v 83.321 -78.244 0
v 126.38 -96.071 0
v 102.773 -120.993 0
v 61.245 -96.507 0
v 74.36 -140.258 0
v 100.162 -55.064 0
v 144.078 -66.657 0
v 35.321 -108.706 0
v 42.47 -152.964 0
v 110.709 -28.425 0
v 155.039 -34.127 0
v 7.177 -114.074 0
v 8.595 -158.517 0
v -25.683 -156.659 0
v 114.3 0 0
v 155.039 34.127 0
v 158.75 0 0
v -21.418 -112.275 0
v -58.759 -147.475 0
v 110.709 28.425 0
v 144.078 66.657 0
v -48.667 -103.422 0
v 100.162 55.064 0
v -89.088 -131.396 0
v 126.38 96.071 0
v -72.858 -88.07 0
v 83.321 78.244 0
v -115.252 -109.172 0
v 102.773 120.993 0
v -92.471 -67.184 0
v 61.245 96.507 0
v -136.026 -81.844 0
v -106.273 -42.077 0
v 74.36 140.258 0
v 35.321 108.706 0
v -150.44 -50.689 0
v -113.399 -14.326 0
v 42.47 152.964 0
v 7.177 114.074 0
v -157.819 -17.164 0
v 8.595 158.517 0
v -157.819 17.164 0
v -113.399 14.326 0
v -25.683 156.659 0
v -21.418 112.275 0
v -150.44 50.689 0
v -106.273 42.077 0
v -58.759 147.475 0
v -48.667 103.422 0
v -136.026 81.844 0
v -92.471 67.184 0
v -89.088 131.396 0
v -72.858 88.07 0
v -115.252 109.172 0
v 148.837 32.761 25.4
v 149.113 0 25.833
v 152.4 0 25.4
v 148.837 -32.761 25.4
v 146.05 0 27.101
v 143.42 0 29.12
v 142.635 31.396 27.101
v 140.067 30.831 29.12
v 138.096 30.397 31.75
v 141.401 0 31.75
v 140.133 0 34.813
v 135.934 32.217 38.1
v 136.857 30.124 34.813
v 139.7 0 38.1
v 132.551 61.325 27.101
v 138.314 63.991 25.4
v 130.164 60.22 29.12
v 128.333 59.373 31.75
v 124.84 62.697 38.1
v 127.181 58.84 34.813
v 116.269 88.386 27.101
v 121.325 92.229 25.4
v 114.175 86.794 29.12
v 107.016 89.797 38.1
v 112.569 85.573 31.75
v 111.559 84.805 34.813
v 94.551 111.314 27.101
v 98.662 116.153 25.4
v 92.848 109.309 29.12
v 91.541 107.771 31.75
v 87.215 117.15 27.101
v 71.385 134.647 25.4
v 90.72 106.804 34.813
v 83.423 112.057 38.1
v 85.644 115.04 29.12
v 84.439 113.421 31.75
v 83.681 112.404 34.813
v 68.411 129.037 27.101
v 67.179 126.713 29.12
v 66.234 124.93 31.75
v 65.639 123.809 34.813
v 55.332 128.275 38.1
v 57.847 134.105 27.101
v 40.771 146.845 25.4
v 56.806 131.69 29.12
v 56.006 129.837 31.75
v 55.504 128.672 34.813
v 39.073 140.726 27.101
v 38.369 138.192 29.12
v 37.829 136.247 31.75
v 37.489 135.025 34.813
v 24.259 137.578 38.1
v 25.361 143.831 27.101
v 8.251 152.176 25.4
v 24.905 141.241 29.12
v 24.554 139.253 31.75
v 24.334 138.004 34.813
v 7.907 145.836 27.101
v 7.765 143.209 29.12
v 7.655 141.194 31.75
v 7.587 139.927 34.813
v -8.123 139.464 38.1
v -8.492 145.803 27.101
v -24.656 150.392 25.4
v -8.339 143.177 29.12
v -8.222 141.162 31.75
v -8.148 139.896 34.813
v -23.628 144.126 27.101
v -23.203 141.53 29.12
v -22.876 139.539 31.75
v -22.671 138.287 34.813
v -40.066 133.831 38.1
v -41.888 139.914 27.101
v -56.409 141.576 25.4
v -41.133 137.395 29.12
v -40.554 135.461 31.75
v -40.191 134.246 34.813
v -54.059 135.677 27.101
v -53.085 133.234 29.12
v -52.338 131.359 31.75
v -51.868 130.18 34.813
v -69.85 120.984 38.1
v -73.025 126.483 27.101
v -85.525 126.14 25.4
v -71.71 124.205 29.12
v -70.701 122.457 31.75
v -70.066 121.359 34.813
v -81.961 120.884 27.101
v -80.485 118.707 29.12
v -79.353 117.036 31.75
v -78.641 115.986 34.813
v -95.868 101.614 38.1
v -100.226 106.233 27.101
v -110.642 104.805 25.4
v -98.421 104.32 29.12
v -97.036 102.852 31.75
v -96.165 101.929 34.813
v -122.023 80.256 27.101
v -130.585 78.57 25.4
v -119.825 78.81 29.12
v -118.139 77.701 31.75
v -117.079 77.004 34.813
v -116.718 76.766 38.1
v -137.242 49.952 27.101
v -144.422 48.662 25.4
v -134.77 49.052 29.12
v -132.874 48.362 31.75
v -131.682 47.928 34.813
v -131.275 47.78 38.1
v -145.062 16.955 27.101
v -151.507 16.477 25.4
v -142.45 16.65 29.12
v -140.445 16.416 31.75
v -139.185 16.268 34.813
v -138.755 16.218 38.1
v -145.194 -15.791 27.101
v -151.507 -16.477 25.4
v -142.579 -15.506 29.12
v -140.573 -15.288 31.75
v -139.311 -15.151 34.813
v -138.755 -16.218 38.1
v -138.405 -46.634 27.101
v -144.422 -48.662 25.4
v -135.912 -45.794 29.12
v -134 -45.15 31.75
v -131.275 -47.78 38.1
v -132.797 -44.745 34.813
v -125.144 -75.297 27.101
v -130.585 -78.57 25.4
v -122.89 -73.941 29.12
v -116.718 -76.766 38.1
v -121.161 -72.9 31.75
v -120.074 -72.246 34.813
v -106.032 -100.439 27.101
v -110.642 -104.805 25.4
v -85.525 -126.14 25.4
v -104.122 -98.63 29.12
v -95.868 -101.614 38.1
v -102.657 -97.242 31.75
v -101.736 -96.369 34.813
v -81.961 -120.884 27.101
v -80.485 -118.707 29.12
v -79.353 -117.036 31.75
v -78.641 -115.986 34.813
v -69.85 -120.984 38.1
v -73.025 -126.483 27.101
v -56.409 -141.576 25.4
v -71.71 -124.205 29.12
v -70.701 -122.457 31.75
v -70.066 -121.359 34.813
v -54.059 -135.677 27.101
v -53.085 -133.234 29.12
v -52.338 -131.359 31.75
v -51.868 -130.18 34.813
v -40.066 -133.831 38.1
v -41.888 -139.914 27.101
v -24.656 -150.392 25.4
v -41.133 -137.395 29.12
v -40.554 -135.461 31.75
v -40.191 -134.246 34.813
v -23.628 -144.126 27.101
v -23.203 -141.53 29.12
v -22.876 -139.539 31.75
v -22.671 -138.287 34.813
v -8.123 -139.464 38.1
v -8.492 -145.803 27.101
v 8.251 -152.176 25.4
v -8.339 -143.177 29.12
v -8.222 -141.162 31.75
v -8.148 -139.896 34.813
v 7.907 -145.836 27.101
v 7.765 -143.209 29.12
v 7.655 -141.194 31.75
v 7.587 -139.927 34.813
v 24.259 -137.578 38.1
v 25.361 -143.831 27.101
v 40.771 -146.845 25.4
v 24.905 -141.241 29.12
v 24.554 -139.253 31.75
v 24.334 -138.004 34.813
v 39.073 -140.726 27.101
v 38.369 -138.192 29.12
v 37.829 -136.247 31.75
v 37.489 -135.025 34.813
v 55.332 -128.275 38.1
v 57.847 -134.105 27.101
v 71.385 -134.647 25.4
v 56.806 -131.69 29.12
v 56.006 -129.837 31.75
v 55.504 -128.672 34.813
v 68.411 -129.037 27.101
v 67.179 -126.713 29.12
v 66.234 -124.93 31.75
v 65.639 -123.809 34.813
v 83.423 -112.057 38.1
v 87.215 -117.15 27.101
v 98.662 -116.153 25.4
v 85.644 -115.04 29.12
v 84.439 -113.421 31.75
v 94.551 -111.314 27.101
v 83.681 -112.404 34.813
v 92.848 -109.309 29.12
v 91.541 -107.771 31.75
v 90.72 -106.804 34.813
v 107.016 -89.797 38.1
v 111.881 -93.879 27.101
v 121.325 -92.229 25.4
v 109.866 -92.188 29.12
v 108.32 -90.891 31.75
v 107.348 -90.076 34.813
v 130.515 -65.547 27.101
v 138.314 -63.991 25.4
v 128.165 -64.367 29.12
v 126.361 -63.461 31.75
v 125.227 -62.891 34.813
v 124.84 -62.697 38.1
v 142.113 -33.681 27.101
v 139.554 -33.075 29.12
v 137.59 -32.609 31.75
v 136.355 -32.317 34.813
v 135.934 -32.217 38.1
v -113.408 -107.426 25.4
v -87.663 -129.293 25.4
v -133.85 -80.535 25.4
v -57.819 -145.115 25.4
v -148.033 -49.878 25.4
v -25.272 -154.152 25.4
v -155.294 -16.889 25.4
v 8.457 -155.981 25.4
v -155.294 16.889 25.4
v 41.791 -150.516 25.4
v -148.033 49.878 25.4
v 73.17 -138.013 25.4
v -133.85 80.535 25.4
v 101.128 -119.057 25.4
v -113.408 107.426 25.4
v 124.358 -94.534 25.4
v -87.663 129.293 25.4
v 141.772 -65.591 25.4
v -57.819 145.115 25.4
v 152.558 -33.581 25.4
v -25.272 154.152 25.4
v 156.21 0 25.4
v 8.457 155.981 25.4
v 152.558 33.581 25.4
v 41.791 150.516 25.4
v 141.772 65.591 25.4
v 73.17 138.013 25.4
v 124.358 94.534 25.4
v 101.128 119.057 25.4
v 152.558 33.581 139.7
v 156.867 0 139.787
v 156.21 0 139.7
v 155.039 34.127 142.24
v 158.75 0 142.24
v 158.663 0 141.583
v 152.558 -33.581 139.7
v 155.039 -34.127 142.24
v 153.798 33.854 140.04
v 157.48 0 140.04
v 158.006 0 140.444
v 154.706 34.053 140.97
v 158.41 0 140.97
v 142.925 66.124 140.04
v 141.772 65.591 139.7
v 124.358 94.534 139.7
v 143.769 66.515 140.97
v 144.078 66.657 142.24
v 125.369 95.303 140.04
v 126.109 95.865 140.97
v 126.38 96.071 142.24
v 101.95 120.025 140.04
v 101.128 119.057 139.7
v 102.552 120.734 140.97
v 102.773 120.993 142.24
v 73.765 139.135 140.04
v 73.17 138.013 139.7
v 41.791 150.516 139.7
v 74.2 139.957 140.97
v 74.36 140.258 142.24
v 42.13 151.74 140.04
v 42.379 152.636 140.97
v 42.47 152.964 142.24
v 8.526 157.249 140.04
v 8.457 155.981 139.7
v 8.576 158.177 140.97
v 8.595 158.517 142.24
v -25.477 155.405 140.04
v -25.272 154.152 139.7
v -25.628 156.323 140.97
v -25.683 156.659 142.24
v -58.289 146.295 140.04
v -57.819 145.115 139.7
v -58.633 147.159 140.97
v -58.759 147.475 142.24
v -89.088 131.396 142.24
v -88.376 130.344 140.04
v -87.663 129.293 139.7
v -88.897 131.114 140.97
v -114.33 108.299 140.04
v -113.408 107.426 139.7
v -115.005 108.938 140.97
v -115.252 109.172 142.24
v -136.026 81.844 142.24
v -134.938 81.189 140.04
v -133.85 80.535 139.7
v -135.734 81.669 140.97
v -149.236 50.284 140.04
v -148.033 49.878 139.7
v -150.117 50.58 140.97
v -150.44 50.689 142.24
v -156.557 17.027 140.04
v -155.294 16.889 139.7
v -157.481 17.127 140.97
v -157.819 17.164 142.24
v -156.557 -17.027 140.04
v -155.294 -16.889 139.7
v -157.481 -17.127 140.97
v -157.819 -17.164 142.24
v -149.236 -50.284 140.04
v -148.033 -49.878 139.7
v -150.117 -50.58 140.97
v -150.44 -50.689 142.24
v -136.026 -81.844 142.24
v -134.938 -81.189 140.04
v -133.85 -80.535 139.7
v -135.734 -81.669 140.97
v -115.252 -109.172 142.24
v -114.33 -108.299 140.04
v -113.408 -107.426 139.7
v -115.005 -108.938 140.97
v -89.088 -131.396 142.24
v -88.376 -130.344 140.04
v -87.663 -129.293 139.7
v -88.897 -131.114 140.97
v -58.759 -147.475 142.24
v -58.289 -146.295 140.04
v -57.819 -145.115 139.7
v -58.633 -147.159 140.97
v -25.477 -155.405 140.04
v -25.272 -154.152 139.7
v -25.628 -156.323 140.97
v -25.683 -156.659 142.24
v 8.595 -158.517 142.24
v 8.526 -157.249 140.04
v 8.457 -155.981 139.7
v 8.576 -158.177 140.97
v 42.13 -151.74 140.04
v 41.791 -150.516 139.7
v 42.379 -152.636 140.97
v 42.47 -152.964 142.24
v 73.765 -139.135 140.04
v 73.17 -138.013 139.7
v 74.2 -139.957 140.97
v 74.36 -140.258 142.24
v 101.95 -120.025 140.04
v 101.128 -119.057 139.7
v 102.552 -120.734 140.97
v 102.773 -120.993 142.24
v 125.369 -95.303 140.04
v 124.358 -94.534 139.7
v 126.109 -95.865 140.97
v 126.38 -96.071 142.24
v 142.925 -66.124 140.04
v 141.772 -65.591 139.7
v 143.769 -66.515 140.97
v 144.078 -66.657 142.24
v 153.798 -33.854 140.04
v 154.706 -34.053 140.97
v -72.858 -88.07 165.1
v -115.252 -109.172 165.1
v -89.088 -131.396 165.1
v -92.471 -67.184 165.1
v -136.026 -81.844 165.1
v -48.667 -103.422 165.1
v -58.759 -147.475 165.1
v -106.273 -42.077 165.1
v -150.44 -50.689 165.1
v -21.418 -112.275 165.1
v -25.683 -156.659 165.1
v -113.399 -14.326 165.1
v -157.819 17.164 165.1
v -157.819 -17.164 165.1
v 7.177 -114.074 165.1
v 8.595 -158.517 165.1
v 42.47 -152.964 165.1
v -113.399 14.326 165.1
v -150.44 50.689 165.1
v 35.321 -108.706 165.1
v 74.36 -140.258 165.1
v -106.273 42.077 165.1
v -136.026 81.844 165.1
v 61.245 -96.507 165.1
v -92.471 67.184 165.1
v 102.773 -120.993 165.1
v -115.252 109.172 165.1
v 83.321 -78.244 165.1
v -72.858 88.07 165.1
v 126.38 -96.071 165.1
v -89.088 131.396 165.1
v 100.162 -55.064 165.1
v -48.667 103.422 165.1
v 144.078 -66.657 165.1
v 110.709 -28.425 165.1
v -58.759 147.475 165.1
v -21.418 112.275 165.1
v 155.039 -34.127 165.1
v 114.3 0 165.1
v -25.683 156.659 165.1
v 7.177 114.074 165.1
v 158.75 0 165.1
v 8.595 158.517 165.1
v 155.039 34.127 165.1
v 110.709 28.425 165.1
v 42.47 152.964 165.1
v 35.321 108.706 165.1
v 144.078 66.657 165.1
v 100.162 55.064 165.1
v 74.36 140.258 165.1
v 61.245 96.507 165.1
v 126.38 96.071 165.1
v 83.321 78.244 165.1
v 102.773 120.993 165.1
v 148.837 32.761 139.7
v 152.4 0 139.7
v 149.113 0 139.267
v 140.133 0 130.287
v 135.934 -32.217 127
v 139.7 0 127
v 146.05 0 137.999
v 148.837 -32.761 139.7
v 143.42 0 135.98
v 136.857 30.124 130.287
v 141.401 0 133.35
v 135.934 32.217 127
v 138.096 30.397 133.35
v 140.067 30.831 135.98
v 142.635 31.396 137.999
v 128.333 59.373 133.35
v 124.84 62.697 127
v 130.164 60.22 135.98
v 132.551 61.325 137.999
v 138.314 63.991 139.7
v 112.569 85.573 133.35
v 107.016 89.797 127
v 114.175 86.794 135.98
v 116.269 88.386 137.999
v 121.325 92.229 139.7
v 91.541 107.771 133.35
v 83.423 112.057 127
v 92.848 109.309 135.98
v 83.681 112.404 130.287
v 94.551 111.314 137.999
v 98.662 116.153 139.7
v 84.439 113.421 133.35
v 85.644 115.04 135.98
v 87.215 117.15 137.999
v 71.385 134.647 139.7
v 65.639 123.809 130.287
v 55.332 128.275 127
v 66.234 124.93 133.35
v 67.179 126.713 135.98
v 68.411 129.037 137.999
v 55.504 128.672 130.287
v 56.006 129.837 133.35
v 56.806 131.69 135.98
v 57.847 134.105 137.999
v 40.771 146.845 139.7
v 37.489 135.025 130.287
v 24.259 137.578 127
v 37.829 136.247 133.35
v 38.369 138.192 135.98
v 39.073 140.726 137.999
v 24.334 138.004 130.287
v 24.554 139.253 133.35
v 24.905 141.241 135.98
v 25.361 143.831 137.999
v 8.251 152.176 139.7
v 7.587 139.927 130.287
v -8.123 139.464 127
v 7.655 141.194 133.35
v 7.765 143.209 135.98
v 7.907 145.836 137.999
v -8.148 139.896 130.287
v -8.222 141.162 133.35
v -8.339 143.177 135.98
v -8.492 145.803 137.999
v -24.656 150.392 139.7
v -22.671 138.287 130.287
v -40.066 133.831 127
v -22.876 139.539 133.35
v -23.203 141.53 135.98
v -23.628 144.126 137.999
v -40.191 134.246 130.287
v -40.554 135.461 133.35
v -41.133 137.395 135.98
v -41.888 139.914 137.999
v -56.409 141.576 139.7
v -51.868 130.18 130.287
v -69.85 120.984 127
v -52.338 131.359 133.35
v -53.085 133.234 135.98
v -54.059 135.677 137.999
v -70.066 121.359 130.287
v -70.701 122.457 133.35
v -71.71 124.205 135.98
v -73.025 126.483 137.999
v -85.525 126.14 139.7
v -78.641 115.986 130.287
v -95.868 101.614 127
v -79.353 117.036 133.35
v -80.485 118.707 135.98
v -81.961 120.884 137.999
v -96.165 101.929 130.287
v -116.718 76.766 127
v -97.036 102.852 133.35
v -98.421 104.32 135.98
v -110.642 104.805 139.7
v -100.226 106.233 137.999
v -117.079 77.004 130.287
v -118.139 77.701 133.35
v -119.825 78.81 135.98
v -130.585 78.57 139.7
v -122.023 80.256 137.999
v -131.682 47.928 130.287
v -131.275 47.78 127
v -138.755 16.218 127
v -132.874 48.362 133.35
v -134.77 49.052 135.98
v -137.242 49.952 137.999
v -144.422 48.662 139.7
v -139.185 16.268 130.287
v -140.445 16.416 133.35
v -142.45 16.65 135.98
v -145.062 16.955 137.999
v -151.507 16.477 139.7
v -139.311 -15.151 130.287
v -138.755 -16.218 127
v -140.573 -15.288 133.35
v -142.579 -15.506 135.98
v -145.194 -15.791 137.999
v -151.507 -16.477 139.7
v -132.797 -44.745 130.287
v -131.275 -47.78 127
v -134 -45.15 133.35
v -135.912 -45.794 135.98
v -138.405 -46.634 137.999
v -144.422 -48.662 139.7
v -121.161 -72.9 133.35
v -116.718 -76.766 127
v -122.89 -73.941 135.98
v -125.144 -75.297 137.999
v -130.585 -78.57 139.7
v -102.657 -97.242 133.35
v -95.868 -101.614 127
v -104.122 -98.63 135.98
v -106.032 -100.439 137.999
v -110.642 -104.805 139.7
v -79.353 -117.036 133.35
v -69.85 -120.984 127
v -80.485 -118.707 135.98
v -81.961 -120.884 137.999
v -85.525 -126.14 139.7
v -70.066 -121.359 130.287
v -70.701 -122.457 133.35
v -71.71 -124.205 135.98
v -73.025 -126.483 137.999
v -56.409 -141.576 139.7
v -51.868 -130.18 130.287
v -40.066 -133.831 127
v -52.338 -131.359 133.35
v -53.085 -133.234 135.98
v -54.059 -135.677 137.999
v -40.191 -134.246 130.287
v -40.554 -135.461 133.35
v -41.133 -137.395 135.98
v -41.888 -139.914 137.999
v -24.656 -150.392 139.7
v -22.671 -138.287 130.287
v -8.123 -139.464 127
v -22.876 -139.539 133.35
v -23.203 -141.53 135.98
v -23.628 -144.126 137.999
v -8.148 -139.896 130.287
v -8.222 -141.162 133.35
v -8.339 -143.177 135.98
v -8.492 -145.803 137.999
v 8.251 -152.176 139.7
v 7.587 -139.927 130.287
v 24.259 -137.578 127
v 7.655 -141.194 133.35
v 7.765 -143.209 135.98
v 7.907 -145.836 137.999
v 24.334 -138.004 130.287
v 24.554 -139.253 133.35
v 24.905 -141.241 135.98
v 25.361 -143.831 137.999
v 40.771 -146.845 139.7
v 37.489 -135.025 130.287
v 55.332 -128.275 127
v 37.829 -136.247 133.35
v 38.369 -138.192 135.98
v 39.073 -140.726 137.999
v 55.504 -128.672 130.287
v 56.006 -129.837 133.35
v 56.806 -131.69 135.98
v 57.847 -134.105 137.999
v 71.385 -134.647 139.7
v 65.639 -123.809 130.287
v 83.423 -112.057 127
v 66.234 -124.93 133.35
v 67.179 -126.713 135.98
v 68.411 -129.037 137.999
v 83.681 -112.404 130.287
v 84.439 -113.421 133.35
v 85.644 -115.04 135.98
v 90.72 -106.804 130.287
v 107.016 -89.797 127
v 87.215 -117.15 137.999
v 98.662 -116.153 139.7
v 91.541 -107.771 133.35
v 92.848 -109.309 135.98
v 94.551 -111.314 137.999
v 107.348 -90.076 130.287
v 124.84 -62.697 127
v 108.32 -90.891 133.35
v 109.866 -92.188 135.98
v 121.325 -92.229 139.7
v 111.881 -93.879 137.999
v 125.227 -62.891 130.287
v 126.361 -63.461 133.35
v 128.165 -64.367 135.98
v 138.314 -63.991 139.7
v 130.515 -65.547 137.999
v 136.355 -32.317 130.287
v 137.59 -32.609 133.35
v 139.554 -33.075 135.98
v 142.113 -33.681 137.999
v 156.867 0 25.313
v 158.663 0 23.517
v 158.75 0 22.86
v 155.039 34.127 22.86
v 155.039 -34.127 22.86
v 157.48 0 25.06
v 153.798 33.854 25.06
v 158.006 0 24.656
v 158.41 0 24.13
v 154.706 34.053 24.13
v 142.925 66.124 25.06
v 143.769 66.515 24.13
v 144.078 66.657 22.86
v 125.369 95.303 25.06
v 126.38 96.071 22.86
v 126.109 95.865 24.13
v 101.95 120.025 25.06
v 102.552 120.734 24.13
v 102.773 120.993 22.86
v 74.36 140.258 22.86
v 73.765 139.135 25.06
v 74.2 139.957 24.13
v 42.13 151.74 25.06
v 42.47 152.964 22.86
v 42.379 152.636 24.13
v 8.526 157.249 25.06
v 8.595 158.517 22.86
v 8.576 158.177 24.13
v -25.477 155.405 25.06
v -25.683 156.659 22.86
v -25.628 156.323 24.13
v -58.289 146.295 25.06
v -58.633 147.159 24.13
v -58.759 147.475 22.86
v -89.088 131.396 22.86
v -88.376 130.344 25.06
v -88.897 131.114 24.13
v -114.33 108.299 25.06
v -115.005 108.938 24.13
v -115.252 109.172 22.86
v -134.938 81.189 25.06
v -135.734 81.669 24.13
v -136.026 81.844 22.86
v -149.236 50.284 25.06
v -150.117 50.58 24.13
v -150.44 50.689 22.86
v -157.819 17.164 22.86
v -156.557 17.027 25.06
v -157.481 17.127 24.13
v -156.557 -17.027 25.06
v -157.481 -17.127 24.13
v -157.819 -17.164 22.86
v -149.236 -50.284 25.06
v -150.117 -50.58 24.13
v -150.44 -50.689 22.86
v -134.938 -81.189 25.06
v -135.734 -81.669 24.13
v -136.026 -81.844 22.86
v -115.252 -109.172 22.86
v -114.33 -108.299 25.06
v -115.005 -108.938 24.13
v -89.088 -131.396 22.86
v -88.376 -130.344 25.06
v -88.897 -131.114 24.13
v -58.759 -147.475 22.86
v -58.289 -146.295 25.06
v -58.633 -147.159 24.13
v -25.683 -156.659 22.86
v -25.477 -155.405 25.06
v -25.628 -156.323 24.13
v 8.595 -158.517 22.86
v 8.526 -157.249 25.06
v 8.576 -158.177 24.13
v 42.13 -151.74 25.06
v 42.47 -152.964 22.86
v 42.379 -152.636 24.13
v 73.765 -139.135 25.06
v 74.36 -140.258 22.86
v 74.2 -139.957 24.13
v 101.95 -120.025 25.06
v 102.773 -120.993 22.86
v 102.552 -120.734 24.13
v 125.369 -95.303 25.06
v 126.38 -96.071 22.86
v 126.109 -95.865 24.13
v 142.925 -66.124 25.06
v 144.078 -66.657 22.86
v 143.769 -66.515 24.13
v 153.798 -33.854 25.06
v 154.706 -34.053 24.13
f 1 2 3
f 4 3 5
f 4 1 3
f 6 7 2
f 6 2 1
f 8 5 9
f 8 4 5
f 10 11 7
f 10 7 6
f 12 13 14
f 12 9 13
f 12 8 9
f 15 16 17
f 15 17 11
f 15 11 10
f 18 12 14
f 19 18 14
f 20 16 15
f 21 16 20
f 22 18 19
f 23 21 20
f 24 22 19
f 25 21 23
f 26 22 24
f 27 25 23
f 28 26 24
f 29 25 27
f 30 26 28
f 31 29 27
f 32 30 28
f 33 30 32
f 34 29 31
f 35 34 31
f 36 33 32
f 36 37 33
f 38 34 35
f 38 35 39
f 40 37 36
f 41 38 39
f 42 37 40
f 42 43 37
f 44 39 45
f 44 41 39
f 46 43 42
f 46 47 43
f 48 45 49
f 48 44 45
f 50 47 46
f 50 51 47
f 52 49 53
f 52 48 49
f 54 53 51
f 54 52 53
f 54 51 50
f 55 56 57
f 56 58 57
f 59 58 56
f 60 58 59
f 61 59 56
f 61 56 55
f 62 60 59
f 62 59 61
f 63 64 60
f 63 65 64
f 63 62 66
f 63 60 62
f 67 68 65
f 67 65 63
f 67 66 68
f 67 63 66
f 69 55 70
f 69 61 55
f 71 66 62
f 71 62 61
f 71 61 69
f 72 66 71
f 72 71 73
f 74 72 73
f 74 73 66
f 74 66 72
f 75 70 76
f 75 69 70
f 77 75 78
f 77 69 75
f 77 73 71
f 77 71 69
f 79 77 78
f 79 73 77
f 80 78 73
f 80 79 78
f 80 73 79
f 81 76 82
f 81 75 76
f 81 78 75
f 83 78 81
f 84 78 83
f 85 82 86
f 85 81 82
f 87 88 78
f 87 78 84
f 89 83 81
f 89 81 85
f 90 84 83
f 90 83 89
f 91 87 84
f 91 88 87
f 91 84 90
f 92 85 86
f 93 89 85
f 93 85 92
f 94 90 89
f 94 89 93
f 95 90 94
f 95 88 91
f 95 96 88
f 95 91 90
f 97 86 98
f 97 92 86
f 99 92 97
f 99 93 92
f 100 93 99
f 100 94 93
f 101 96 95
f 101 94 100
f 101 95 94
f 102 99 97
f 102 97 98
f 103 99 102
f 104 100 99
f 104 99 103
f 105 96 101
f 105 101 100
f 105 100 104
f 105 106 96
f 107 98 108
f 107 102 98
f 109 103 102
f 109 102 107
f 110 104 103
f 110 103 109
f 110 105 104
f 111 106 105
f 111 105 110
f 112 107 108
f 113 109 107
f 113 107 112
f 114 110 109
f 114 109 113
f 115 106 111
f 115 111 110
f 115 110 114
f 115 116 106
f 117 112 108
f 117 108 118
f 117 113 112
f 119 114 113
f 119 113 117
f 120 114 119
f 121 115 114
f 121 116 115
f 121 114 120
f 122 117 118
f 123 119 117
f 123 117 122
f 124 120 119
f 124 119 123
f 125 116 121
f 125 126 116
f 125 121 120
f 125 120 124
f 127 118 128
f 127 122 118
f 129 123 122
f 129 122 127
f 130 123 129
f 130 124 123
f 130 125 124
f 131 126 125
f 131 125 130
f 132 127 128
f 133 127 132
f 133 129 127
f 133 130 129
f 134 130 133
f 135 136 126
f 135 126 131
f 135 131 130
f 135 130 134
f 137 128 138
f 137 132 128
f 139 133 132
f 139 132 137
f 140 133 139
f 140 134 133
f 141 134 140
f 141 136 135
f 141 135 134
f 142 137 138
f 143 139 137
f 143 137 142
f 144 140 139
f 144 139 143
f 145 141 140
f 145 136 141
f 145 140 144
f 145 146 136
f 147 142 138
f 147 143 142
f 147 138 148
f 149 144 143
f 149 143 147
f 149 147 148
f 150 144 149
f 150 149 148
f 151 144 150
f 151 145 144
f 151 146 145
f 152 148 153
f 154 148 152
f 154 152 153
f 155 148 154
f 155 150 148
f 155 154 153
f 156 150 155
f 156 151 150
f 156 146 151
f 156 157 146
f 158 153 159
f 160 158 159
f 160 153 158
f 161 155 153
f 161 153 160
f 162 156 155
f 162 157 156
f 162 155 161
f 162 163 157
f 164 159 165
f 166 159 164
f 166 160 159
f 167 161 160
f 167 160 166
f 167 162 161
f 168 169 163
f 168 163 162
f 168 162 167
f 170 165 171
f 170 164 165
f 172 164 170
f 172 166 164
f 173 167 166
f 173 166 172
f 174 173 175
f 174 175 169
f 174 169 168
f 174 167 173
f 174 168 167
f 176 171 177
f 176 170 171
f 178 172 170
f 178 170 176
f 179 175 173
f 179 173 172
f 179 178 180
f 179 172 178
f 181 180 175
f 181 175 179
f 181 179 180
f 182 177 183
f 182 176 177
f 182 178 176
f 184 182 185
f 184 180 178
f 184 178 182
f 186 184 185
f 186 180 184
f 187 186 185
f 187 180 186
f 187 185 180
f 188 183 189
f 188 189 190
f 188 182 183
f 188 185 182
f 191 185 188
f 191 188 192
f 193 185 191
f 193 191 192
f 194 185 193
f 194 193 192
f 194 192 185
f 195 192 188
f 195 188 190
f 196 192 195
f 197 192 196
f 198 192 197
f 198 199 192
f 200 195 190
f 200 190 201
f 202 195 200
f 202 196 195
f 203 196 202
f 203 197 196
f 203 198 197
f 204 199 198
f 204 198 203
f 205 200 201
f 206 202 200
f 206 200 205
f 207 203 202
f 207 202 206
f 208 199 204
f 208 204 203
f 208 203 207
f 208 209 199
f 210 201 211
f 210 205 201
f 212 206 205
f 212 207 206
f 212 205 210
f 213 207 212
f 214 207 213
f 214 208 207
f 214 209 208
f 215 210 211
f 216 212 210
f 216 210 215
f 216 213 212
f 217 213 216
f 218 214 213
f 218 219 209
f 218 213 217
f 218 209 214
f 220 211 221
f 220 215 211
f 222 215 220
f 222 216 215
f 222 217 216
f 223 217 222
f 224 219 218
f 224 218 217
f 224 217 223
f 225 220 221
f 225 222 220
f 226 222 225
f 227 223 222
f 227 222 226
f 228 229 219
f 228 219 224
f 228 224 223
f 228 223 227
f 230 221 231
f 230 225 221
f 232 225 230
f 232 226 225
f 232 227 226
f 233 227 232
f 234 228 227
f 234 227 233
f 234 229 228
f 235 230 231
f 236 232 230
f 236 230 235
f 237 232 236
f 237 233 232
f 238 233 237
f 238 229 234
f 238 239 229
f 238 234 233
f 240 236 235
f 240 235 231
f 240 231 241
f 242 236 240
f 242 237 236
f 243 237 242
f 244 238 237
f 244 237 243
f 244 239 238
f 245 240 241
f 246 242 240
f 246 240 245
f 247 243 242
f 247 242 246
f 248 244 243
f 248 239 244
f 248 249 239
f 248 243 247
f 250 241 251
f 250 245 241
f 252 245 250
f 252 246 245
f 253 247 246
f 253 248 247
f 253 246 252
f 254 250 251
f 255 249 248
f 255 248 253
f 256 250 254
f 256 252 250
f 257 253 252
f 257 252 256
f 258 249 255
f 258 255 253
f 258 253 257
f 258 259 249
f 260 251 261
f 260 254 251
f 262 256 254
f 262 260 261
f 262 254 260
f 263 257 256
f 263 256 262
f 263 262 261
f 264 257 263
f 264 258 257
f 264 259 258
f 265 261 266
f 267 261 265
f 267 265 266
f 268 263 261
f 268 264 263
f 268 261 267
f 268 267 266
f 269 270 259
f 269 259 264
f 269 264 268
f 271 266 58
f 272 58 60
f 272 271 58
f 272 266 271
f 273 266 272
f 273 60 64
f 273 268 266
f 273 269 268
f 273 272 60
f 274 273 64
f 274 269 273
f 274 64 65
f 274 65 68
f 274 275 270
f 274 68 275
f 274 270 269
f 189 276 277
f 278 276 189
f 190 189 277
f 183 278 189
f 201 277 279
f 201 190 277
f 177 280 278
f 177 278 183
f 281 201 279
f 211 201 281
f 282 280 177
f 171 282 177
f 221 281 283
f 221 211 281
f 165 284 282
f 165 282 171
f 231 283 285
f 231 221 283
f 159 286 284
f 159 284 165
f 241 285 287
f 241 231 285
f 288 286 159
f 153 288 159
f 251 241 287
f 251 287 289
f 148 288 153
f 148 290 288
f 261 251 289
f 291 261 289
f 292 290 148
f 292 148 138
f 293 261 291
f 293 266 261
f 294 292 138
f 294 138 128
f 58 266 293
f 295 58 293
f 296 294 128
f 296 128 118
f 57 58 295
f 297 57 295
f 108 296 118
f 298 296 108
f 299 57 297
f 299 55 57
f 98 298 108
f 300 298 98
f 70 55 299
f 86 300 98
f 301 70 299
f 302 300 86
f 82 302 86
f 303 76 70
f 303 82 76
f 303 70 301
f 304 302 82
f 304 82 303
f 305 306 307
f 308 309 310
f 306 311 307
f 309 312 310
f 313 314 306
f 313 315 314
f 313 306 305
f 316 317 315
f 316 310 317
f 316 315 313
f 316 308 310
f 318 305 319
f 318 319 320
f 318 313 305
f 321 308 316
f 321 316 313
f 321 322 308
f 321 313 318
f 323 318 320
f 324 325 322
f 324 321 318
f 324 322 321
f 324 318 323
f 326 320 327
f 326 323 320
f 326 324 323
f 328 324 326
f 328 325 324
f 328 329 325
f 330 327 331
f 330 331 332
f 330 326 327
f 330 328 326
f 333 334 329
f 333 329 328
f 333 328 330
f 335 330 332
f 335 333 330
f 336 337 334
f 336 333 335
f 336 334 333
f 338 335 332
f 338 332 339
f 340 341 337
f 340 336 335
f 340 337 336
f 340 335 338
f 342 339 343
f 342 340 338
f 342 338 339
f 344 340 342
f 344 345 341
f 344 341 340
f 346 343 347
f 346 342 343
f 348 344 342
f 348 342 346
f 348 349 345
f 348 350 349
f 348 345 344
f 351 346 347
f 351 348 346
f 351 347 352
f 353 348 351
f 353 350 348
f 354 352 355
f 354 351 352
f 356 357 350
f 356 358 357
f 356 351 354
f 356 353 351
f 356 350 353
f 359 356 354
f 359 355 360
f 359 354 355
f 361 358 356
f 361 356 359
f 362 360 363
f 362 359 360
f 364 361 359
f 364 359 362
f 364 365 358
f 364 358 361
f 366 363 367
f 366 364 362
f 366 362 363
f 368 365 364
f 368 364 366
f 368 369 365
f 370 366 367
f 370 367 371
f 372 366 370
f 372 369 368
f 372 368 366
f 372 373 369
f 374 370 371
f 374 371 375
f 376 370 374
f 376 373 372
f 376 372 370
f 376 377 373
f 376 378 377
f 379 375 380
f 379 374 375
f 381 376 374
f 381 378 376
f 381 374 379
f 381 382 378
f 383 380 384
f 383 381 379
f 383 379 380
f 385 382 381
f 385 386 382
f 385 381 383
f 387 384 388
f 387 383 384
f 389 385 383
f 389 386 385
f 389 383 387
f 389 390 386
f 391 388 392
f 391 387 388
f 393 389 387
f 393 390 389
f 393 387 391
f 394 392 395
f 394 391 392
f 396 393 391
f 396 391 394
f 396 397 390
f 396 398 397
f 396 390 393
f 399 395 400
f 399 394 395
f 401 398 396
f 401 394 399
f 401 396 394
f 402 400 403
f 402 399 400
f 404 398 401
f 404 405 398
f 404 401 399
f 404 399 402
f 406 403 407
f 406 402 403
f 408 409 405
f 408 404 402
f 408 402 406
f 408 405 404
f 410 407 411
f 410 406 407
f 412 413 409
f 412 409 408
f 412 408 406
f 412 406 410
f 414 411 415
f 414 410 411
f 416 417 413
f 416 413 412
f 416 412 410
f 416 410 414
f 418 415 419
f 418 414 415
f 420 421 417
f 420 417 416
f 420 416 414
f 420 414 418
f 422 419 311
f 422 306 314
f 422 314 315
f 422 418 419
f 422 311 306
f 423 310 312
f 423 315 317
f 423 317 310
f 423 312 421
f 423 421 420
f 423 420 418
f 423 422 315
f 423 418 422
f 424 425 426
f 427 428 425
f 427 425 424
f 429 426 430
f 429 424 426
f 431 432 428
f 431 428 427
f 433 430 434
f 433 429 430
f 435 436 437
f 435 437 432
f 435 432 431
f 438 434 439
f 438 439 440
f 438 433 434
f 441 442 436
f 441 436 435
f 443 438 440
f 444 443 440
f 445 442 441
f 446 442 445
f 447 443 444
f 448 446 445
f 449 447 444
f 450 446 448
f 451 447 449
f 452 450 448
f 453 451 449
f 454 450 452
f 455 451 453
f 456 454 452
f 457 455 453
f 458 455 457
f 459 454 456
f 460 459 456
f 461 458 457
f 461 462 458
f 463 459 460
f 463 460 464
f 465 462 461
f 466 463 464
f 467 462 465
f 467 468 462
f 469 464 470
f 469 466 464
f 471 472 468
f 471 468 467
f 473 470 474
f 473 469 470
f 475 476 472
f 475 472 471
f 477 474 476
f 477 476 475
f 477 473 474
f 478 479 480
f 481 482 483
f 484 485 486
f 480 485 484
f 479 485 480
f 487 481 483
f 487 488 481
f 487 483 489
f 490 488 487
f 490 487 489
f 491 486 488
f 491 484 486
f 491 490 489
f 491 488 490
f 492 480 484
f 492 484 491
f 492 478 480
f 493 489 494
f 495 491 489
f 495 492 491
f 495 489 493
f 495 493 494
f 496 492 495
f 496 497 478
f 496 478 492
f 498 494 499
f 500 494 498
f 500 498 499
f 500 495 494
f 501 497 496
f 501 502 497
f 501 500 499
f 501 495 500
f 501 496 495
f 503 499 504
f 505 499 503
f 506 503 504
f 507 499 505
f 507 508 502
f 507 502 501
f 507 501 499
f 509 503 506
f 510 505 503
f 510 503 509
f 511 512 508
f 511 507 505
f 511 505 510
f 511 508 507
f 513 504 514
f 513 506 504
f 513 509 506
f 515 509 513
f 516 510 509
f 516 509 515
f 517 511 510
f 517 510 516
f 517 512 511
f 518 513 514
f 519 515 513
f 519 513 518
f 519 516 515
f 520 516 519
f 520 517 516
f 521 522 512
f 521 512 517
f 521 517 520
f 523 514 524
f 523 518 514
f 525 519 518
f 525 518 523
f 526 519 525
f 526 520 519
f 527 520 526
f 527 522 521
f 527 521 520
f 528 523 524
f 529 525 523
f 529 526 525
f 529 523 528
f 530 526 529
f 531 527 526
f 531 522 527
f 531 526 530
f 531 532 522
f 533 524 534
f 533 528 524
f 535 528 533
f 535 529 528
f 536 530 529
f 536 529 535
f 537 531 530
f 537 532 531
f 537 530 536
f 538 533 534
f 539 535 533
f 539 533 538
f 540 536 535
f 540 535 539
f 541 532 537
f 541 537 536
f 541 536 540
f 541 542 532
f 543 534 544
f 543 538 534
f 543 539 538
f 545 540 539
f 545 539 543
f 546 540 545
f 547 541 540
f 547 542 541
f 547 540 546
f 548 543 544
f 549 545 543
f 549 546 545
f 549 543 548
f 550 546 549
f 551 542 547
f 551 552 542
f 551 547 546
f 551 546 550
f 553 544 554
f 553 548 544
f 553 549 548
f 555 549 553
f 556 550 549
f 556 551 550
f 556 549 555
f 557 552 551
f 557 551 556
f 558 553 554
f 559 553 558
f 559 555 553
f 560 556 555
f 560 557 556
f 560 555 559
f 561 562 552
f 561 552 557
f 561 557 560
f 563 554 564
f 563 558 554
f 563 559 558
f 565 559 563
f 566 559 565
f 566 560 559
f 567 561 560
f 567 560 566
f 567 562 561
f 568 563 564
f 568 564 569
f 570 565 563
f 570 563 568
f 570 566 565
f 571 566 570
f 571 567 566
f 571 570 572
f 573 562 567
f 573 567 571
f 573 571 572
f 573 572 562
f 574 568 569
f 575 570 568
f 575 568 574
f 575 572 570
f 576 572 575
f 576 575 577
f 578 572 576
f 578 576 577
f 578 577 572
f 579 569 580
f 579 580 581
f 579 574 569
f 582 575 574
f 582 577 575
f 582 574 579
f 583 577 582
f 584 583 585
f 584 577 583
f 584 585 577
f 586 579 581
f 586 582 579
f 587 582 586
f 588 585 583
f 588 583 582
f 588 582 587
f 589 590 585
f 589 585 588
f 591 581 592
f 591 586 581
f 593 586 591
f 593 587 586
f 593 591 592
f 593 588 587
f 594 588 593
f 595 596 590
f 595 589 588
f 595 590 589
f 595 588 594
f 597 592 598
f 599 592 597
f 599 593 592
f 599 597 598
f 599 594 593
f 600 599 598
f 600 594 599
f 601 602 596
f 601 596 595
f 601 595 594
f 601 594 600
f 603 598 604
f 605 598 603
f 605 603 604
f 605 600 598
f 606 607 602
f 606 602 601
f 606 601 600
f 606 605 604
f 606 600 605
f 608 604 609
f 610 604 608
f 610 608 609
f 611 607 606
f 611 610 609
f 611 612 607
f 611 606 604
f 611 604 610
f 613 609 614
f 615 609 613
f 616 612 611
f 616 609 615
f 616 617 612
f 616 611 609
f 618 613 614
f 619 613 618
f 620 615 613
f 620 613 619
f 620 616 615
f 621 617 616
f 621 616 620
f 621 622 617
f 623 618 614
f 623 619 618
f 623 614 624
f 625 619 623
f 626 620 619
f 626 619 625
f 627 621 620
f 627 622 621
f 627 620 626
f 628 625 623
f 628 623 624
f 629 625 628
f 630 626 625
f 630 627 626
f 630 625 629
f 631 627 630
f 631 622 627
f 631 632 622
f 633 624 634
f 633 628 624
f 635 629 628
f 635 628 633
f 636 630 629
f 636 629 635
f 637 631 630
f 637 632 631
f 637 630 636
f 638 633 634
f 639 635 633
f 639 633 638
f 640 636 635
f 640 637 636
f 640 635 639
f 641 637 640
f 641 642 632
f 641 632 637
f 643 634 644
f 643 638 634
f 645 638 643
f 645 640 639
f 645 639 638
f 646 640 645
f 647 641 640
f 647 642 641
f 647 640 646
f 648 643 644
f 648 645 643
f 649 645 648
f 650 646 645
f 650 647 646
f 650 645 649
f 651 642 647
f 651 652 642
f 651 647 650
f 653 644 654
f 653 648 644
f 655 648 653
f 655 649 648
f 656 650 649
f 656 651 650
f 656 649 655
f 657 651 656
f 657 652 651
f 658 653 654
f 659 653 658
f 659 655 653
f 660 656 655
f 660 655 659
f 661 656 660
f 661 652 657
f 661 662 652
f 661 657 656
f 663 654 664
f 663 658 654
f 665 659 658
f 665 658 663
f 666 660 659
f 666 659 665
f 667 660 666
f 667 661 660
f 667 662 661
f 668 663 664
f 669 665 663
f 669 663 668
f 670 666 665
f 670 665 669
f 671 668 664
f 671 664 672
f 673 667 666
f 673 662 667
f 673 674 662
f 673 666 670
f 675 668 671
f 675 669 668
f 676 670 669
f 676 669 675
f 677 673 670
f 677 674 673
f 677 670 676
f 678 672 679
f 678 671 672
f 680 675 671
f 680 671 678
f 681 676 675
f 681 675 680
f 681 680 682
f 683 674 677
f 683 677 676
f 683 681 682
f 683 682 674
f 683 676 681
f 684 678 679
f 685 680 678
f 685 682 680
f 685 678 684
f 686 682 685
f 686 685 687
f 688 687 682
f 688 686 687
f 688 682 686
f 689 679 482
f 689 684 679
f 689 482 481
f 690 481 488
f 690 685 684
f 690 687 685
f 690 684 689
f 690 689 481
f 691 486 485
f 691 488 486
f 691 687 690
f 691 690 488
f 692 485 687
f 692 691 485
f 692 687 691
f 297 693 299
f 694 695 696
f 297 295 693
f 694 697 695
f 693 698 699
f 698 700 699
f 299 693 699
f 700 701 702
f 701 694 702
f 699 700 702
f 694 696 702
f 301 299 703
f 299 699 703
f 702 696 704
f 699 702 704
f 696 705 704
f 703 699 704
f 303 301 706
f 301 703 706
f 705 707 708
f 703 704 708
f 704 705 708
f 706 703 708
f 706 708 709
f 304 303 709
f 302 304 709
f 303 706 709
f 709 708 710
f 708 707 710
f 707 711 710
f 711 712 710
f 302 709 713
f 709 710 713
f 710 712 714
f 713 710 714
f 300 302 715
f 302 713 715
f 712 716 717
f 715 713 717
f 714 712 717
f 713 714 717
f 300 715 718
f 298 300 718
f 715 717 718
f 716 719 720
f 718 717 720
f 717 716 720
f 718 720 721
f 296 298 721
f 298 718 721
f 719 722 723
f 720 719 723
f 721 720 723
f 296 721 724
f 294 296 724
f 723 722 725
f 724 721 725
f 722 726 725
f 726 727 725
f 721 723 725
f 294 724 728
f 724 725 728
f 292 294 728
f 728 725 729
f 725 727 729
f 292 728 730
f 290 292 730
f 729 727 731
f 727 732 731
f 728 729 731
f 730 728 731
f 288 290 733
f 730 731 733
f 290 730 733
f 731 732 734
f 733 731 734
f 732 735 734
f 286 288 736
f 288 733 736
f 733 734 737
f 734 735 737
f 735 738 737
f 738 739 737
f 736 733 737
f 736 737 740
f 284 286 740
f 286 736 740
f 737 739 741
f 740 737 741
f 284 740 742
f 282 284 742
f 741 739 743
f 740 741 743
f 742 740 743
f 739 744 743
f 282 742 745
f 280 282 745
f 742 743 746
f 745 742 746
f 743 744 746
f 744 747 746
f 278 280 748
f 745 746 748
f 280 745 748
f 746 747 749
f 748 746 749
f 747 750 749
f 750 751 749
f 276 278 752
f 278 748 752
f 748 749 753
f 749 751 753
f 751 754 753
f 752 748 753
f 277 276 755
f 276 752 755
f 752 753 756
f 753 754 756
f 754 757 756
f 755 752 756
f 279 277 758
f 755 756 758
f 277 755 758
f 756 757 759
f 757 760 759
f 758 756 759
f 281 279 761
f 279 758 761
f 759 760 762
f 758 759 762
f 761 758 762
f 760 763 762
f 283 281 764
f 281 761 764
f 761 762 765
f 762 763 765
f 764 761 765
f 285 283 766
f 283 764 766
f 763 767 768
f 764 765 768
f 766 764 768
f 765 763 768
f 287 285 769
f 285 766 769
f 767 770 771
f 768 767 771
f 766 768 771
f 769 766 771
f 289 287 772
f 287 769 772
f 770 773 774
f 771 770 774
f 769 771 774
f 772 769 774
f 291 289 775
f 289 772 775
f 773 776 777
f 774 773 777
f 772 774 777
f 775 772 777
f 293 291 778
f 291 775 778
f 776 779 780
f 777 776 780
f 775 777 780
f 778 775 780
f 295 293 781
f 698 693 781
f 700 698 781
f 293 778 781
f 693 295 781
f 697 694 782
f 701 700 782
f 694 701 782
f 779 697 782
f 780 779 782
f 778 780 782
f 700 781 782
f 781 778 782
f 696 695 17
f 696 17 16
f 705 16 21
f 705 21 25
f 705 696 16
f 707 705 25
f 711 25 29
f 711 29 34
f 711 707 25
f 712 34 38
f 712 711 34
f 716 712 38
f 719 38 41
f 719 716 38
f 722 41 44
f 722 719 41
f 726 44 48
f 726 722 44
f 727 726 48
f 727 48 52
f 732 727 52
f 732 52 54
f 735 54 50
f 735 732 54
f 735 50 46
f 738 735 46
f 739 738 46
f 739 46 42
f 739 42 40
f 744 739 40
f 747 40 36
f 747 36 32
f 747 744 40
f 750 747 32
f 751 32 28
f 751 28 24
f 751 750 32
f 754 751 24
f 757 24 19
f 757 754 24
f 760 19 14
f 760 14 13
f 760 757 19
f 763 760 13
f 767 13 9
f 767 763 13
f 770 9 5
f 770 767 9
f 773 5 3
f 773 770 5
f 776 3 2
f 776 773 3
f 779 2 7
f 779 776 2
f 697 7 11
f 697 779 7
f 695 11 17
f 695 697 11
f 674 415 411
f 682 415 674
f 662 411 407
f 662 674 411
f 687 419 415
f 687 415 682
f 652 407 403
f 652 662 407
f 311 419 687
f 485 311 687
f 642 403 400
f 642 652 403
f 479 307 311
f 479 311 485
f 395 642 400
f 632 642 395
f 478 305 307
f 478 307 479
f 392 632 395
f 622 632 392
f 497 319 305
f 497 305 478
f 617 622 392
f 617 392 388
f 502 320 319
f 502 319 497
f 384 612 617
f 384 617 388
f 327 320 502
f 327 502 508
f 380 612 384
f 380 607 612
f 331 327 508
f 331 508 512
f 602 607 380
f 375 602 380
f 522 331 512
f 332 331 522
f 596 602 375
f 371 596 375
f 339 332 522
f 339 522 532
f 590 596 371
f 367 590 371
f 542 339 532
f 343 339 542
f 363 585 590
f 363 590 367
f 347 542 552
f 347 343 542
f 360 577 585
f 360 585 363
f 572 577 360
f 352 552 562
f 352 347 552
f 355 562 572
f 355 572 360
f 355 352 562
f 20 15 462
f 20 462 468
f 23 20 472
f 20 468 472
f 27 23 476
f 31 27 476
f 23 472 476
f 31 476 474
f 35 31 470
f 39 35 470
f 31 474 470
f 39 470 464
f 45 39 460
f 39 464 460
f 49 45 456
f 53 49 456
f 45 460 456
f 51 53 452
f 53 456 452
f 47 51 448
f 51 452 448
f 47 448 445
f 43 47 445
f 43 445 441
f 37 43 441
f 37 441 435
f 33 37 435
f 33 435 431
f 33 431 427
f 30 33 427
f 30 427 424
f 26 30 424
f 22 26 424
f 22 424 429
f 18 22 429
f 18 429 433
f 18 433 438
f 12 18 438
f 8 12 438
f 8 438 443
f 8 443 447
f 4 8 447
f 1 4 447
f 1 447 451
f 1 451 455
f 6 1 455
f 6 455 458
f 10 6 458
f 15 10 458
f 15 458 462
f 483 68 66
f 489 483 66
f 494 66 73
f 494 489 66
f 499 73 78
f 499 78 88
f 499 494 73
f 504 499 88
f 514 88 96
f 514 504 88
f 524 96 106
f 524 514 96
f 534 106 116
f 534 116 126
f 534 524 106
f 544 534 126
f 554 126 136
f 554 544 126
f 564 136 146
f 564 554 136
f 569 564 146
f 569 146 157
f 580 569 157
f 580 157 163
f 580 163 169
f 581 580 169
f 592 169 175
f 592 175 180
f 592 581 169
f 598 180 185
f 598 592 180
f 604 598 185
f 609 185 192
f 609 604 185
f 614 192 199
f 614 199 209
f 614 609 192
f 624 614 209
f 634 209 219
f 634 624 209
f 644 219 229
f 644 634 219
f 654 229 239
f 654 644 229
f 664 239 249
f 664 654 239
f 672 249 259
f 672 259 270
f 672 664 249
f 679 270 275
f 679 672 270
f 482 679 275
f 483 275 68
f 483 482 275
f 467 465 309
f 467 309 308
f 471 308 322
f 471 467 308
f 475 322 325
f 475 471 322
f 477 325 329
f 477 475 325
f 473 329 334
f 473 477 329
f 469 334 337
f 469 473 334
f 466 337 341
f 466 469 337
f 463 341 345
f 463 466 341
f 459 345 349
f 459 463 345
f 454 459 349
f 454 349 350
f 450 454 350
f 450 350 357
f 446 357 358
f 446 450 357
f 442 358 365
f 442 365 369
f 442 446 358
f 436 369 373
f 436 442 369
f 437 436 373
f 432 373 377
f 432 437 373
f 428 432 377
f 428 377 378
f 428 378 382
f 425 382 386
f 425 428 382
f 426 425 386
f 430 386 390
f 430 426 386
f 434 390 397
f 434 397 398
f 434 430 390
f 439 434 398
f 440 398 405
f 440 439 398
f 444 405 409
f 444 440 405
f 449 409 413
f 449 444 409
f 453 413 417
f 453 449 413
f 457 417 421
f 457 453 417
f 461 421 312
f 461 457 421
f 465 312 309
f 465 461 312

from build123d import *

# Parameters (mm, degrees)
F2_R     = 12.7
F3_R     = 2.54
F4_R     = 114.3
F5_DEPTH = 165.101


with BuildPart() as f1:
    # F0 (on Front) → F1 (revolve)
    with BuildSketch(Plane.XZ):
        Polygon((0, 165.1), (0, 0), (158.75, 0), (158.75, 25.4), (139.7, 25.4), (139.7, 139.7), (158.75, 139.7), (158.75, 165.1), align=None)
    revolve(axis=Axis((0, 0, 82.55), (0, 0, 1)))

    # F2
    f2_edges = [f1.edges().sort_by_distance(p)[0] for p in [
        (-139.7, 0, 139.7),
        (-139.7, 0, 25.4),
    ]]
    fillet(f2_edges, radius=F2_R)

    # F3
    f3_edges = [f1.edges().sort_by_distance(p)[0] for p in [
        (-158.75, 0, 25.4),
        (-158.75, 0, 139.7),
    ]]
    fillet(f3_edges, radius=F3_R)

    # F4 (on face) → F5 (cut, through all)
    with BuildSketch(Plane.XY.offset(165.1)):
        Circle(F4_R)
    extrude(amount=-F5_DEPTH, mode=Mode.SUBTRACT)


solid = f1.part
